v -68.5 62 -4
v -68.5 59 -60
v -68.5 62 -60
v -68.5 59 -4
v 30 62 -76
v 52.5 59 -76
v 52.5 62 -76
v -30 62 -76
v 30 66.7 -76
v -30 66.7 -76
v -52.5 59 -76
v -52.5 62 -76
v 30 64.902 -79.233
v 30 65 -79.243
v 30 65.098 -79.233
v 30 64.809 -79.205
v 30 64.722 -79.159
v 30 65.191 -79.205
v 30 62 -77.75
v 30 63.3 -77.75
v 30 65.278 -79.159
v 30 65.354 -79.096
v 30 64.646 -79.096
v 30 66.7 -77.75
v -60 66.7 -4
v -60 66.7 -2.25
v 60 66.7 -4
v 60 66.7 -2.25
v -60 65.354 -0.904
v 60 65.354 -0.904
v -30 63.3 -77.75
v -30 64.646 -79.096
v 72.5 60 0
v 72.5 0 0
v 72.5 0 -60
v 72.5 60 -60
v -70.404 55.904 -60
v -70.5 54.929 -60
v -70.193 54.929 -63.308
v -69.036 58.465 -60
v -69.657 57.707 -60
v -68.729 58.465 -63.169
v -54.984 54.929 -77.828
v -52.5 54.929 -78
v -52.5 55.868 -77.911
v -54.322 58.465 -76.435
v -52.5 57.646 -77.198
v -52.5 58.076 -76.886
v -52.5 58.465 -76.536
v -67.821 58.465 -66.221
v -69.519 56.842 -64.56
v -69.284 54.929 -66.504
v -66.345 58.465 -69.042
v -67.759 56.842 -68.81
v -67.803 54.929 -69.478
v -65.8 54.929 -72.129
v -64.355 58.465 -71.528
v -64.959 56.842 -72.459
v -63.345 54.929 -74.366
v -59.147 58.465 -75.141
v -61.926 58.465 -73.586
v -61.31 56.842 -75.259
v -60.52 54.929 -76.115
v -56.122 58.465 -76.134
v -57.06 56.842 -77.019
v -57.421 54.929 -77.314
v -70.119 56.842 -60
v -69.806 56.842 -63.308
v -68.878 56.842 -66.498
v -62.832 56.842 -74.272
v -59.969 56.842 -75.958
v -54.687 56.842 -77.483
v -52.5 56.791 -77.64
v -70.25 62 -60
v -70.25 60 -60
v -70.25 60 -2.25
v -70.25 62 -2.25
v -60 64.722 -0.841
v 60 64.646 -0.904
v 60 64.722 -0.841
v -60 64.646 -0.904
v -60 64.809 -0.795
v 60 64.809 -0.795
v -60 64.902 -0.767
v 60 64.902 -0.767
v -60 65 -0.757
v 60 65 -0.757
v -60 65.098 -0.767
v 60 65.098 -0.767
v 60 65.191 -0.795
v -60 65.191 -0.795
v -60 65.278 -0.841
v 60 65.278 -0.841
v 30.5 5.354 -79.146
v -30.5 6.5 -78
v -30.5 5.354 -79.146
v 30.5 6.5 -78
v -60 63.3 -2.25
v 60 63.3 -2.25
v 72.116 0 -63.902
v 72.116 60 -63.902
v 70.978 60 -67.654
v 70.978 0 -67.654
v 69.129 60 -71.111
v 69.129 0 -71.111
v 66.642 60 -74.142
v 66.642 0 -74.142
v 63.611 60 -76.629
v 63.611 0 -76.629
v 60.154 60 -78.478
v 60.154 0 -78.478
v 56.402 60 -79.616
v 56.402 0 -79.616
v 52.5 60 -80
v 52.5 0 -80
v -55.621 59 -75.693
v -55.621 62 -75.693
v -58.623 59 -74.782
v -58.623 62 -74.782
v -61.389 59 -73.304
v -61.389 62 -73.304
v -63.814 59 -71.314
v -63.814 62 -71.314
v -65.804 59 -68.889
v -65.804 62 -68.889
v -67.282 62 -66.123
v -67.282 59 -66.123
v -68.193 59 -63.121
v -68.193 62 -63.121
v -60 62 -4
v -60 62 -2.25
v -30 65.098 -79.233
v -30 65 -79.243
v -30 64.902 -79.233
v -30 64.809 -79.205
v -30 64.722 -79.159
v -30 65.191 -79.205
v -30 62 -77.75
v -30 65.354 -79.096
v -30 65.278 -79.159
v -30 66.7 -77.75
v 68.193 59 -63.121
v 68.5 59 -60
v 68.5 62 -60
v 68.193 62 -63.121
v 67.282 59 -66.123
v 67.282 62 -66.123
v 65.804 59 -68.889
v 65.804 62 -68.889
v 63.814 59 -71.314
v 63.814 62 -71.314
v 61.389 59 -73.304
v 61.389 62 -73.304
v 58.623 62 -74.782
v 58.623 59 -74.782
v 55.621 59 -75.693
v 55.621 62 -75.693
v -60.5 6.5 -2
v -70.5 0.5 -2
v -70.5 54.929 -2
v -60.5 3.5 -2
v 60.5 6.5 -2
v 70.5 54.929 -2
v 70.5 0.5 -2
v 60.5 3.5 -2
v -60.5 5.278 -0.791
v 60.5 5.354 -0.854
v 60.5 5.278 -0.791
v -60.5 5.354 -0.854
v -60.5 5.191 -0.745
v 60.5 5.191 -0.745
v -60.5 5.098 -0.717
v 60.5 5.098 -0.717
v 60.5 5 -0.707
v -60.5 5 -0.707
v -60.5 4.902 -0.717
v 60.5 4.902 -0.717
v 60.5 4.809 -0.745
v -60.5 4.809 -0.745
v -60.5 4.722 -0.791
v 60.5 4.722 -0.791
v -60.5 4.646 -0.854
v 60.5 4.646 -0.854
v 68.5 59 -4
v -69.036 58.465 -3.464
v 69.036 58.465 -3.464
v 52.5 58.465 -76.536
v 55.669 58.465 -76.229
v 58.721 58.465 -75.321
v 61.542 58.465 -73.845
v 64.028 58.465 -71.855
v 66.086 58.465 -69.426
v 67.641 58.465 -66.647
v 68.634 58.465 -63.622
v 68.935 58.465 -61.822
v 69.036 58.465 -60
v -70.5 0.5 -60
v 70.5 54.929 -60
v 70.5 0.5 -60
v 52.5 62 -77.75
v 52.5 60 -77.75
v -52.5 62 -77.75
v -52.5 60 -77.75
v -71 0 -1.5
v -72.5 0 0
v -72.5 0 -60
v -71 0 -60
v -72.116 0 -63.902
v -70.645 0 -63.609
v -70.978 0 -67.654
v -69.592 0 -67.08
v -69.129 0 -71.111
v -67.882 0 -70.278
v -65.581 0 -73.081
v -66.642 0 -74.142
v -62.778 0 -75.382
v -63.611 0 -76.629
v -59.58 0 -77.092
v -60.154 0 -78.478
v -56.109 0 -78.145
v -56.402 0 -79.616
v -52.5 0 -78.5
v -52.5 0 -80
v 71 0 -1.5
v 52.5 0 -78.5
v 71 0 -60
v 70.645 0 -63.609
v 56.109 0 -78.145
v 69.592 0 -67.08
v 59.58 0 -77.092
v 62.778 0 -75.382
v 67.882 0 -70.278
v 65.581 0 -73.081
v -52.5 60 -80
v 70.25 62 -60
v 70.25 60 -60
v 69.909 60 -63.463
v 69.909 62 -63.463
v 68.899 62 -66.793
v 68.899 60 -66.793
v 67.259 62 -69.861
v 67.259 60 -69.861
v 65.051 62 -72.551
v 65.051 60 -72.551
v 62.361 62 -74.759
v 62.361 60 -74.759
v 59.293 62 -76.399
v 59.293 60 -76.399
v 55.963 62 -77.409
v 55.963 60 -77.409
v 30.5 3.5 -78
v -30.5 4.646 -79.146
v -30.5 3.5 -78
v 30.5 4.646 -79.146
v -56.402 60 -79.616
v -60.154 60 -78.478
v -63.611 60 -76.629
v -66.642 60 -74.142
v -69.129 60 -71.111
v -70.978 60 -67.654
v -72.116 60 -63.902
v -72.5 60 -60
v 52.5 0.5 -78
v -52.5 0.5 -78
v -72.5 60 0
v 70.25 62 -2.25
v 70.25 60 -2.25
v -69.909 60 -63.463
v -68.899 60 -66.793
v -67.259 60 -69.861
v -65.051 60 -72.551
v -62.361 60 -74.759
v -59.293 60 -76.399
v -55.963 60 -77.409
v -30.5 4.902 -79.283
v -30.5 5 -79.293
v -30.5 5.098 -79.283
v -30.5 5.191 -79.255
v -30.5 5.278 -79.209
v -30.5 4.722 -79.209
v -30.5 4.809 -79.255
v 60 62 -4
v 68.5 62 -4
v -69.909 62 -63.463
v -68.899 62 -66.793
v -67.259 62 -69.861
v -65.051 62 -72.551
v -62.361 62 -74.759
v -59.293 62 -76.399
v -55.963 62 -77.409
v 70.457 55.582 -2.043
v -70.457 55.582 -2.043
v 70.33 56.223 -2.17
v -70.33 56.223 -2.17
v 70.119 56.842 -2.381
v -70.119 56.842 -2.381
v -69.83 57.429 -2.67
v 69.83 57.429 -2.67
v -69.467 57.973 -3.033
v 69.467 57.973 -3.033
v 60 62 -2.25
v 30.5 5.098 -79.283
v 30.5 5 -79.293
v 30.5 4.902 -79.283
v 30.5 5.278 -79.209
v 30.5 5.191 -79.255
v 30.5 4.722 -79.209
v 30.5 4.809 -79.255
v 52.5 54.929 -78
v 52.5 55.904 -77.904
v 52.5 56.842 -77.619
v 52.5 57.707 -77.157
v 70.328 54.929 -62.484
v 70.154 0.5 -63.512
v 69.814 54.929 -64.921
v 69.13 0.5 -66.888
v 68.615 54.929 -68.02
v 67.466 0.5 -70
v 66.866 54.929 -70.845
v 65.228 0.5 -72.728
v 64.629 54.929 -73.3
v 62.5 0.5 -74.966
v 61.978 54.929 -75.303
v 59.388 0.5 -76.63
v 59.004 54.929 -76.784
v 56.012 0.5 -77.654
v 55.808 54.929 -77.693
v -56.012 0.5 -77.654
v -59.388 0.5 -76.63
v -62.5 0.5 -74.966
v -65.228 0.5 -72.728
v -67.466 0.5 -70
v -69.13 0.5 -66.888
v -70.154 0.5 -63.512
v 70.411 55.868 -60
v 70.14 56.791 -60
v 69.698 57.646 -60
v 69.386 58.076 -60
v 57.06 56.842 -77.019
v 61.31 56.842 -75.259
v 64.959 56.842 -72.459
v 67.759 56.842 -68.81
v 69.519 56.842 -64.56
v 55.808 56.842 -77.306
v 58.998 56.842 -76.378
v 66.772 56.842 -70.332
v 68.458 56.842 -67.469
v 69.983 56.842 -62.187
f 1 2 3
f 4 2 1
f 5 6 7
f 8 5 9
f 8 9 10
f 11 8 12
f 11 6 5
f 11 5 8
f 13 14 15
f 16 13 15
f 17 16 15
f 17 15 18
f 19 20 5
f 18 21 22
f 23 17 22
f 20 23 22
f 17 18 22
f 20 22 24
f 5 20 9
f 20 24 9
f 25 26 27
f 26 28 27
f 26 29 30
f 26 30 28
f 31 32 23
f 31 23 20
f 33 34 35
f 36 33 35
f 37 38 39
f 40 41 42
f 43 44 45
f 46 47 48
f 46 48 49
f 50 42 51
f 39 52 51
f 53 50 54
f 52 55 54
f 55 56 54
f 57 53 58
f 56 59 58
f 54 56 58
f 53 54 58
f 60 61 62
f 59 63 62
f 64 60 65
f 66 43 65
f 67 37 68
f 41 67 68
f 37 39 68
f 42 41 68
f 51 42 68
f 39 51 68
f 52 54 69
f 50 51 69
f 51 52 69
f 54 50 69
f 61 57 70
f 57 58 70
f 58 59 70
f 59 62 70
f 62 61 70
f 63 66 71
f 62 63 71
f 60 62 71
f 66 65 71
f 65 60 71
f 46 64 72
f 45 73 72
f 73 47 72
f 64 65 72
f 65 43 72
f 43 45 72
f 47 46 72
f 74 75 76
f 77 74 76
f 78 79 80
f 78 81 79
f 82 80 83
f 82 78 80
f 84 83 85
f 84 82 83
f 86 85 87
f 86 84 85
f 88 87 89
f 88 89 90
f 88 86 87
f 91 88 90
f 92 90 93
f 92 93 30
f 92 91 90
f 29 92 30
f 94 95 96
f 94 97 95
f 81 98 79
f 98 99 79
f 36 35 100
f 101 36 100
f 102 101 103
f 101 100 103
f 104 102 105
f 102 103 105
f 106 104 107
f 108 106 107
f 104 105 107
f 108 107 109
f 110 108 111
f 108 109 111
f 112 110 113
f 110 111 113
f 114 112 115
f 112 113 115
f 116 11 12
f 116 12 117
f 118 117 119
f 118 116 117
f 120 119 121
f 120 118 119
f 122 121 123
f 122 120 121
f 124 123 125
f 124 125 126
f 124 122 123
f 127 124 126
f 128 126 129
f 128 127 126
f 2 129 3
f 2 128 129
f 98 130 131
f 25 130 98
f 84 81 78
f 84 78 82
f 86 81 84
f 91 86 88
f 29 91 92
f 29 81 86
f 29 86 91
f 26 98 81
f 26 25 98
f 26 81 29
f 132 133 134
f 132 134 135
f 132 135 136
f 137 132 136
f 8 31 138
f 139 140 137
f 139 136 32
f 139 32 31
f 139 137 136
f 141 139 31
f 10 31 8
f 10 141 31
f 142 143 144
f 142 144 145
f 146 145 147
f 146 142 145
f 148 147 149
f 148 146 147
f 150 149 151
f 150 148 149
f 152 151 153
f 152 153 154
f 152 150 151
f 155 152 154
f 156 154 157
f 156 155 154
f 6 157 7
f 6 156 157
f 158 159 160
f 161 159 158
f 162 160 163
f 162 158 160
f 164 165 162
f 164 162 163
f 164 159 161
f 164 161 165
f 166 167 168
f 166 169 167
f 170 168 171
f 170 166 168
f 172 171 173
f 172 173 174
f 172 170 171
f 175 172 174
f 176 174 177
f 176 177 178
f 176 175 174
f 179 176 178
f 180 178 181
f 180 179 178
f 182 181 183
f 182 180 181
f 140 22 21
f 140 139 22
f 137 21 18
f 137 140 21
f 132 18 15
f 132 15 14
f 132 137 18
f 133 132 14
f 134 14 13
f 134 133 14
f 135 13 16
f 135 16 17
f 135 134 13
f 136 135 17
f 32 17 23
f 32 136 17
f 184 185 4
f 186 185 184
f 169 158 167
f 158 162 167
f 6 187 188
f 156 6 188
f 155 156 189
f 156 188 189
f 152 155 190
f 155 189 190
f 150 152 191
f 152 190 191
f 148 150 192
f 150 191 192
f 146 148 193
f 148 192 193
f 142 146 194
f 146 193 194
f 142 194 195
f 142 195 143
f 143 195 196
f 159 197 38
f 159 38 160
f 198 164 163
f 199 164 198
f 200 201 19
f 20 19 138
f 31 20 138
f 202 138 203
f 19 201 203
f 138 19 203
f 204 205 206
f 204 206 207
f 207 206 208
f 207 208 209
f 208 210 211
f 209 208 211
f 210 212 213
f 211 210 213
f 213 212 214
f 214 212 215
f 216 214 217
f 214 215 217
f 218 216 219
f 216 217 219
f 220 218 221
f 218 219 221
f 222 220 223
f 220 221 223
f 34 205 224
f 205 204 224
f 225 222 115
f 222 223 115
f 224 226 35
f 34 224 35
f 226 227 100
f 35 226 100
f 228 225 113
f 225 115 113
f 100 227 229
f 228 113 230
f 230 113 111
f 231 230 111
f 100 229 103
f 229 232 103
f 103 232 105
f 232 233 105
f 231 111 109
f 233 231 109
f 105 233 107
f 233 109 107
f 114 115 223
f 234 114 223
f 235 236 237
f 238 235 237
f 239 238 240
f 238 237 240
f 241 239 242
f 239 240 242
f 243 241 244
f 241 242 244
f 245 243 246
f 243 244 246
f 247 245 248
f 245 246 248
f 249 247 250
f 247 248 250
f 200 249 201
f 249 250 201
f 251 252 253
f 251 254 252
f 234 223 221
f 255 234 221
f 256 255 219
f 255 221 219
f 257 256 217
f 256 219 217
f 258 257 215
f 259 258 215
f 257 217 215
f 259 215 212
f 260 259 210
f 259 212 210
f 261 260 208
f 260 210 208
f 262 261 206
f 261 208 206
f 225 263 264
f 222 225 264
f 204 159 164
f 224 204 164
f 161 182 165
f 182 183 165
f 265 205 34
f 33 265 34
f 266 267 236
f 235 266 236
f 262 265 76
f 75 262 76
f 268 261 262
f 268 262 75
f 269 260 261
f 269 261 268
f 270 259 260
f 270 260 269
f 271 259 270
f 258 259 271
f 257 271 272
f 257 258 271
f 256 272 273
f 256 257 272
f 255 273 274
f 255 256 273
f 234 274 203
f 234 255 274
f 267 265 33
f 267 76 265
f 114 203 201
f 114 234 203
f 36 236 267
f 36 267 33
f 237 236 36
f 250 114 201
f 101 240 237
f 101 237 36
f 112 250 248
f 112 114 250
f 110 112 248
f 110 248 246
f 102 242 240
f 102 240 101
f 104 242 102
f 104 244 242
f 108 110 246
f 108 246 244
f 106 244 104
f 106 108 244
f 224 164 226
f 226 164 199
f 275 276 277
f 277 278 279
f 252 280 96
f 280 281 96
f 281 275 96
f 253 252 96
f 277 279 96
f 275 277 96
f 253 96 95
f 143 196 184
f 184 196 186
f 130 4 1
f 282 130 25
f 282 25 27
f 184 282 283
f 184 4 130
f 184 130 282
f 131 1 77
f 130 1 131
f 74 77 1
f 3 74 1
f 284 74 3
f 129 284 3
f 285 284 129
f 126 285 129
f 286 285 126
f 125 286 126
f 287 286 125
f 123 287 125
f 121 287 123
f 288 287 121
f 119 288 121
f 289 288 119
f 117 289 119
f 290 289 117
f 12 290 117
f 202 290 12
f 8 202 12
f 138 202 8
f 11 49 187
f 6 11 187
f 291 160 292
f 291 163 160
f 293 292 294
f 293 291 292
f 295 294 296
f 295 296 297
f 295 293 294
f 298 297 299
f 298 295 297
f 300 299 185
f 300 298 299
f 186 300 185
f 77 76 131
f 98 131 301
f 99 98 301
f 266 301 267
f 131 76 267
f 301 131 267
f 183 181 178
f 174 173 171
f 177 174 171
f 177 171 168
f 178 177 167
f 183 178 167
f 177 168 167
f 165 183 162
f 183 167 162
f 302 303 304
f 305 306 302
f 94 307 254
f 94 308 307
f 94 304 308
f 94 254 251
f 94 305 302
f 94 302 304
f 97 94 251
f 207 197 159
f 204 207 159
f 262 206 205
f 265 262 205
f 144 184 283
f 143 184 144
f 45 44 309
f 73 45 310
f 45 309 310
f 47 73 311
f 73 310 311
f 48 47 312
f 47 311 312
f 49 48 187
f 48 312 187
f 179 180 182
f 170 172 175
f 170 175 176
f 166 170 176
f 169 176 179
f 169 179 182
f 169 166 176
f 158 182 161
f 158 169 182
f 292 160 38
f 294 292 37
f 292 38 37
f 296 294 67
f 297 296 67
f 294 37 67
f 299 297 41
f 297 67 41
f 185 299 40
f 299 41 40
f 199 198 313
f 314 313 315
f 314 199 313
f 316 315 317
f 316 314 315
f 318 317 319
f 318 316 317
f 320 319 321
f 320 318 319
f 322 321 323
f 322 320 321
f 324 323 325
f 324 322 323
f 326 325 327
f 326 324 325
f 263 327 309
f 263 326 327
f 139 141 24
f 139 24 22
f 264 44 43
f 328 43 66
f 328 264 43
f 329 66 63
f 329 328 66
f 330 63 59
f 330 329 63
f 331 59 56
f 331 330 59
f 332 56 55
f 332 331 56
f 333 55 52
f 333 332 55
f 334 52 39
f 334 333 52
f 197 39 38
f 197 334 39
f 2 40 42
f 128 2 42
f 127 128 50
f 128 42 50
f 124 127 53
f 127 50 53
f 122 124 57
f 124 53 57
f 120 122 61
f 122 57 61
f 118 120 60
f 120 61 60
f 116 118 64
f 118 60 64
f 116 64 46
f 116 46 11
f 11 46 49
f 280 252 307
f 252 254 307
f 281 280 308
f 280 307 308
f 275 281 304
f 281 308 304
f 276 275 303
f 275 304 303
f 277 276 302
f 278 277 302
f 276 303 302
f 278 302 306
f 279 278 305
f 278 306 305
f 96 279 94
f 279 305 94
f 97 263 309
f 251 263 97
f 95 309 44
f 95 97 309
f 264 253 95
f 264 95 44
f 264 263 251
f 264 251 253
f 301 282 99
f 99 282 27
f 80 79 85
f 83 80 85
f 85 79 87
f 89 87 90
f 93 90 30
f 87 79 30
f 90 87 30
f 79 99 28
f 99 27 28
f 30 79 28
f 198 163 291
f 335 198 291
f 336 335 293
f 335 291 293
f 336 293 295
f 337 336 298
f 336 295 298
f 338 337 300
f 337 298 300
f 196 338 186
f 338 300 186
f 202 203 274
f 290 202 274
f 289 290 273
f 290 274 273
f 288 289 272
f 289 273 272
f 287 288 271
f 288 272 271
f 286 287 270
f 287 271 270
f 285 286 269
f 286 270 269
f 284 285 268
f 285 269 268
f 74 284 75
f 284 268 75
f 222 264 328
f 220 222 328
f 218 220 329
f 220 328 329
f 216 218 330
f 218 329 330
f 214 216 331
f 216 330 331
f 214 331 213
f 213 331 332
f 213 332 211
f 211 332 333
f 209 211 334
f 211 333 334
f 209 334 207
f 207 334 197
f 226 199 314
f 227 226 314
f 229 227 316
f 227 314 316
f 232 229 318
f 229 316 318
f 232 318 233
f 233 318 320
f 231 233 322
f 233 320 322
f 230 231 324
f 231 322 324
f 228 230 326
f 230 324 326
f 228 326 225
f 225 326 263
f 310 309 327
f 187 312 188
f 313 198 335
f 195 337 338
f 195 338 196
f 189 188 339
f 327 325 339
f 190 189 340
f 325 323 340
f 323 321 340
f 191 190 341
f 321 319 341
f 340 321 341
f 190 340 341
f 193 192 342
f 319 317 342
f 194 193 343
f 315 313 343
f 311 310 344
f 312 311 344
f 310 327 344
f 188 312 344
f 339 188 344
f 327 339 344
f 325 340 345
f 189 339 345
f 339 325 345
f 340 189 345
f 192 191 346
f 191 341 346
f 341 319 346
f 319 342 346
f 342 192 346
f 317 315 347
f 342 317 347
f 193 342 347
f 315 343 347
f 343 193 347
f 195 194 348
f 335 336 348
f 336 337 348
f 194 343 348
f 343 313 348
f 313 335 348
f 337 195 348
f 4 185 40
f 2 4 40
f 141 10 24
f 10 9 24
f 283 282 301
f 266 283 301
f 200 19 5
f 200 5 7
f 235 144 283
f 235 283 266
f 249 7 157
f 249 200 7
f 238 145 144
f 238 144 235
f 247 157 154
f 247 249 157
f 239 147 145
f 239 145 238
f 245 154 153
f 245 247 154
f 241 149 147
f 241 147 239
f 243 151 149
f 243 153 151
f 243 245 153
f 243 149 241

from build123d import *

# Parameters (mm, degrees)
EXTRUDE_1_DEPTH     = 60
EXTRUDE_START       = -1
EXTRUDE_2_DEPTH     = 1
CHAMFER_3_SIZE      = 2
EXTRUDE_8_DEPTH     = 2
EXTRUDE_9_DEPTH     = 30
EXTRUDE_10_DEPTH    = 60
CUT_EXTRUDE_2_DEPTH = 60.5
CUT_EXTRUDE_3_DEPTH = 30.5
CHAMFER_6_SIZE      = 0.5
FILLET_3_R          = 5
FILLET_4_R          = 0.5
FILLET_5_R          = 0.5


with BuildPart() as part:
    # Эскиз1 → Бобышка-Вытянуть1 (new body)
    with BuildSketch(Plane(origin=(0, 0, 0), x_dir=(1, 0, 0), z_dir=(0, 1, 0))):
        with BuildLine():
            Line((-72.5, 0), (72.5, 0))
            Line((72.5, 0), (72.5, 60))
            ThreePointArc((72.5, 60), (66.642135624, 74.142135624), (52.5, 80))
            Line((52.5, 80), (-52.5, 80))
            ThreePointArc((-52.5, 80), (-66.642135624, 74.142135624), (-72.5, 60))
            Line((-72.5, 60), (-72.5, 0))
        make_face()
        with BuildLine():
            Line((-70.5, 2), (70.5, 2))
            Line((70.5, 2), (70.5, 60))
            ThreePointArc((70.5, 60), (65.227922061, 72.727922061), (52.5, 78))
            Line((52.5, 78), (-52.5, 78))
            ThreePointArc((-52.5, 78), (-65.227922061, 72.727922061), (-70.5, 60))
            Line((-70.5, 60), (-70.5, 2))
        make_face(mode=Mode.SUBTRACT)
    extrude(amount=EXTRUDE_1_DEPTH)

    # Эскиз2 → Бобышка-Вытянуть2 (add)
    with BuildSketch(Plane(origin=(0, 60, 0), x_dir=(1, 0, 0), z_dir=(0, 1, 0)).offset(EXTRUDE_START)):
        with BuildLine():
            Line((-72.5, 60), (-72.5, 0))
            Line((-72.5, 0), (72.5, 0))
            Line((72.5, 0), (72.5, 60))
            ThreePointArc((72.5, 60), (66.642135624, 74.142135624), (52.5, 80))
            Line((52.5, 80), (-52.5, 80))
            ThreePointArc((-52.5, 80), (-66.642135624, 74.142135624), (-72.5, 60))
        make_face()
        with BuildLine():
            Line((-68.5, 60), (-68.5, 4))
            Line((-68.5, 4), (68.5, 4))
            Line((68.5, 4), (68.5, 60))
            ThreePointArc((68.5, 60), (63.813708499, 71.313708499), (52.5, 76))
            Line((52.5, 76), (-52.5, 76))
            ThreePointArc((-52.5, 76), (-63.813708499, 71.313708499), (-68.5, 60))
        make_face(mode=Mode.SUBTRACT)
    extrude(amount=EXTRUDE_2_DEPTH)

    # Фаска3
    chamfer_3_edges = [part.edges().sort_by_distance(p)[0] for p in [
        (-65.227922061, 59, -72.727922061),
        (-70.5, 59, -31),
        (0, 59, -2),
        (70.5, 59, -31),
        (65.227922061, 59, -72.727922061),
        (0, 59, -78),
    ]]
    chamfer(chamfer_3_edges, length=CHAMFER_3_SIZE - 0.0001)  # a hair under: the kernel refuses the full size

    # Эскиз11 → Бобышка-Вытянуть8 (add)
    with BuildSketch(Plane(origin=(0, 60, 0), x_dir=(1, 0, 0), z_dir=(0, 1, 0))):
        with BuildLine():
            Line((70.25, 2.25), (70.25, 60))
            ThreePointArc((70.25, 60), (65.051145366, 72.551145366), (52.5, 77.75))
            Line((52.5, 77.75), (-52.5, 77.75))
            ThreePointArc((-52.5, 77.75), (-65.051145366, 72.551145366), (-70.25, 60))
            Line((-70.25, 60), (-70.25, 2.25))
            Line((-70.25, 2.25), (70.25, 2.25))
        make_face()
        with BuildLine():
            Line((68.5, 4), (68.5, 60))
            ThreePointArc((68.5, 60), (63.813708499, 71.313708499), (52.5, 76))
            Line((52.5, 76), (-52.5, 76))
            ThreePointArc((-52.5, 76), (-63.813708499, 71.313708499), (-68.5, 60))
            Line((-68.5, 60), (-68.5, 4))
            Line((-68.5, 4), (68.5, 4))
        make_face(mode=Mode.SUBTRACT)
    extrude(amount=EXTRUDE_8_DEPTH)

    # Эскиз12 → Бобышка-Вытянуть9 (add, symmetric)
    with BuildSketch(Plane(origin=(0, 0, 0), x_dir=(0, 0, -1), z_dir=(1, 0, 0))):
        Polygon((76, 62), (76, 66.7), (77.75, 66.7), (79.45, 65), (77.75, 63.3), (77.75, 62), align=None)
    extrude(amount=EXTRUDE_9_DEPTH, both=True)

    # Эскиз13 → Бобышка-Вытянуть10 (add, symmetric)
    with BuildSketch(Plane(origin=(0, 0, 0), x_dir=(0, 0, -1), z_dir=(1, 0, 0))):
        Polygon((2.25, 62), (2.25, 63.3), (0.55, 65), (2.25, 66.7), (4, 66.7), (4, 62), align=None)
    extrude(amount=EXTRUDE_10_DEPTH, both=True)

    # Эскиз15 → Вырез-Вытянуть2 (cut, symmetric)
    with BuildSketch(Plane(origin=(0, 0, 0), x_dir=(0, 0, -1), z_dir=(1, 0, 0))):
        Polygon((2, 3.5), (2, 6.5), (0.5, 5), align=None)
    extrude(amount=CUT_EXTRUDE_2_DEPTH, both=True, mode=Mode.SUBTRACT)

    # Эскиз16 → Вырез-Вытянуть3 (cut, symmetric)
    with BuildSketch(Plane(origin=(0, 0, 0), x_dir=(0, 0, -1), z_dir=(1, 0, 0))):
        Polygon((78, 3.5), (78, 6.5), (79.5, 5), align=None)
    extrude(amount=CUT_EXTRUDE_3_DEPTH, both=True, mode=Mode.SUBTRACT)

    # Фаска6
    chamfer_6_edges = [part.edges().sort_by_distance(p)[0] for p in [
        (-70.5, 0, -31),
        (0, 0, -2),
        (70.5, 0, -31),
        (65.227922061, 0, -72.727922061),
        (0, 0, -78),
        (-65.227922061, 0, -72.727922061),
    ]]
    chamfer(chamfer_6_edges, length=CHAMFER_6_SIZE)

    # Скругление3
    fillet_3_edges = [part.edges().sort_by_distance(p)[0] for p in [
        (70.5, 57.0001, -31),
        (65.227922061, 57.0001, -72.727922061),
        (0, 57.0001, -78),
        (-65.227922061, 57.0001, -72.727922061),
        (0, 57.0001, -2),
        (-70.5, 57.0001, -31),
    ]]
    fillet(fillet_3_edges, radius=FILLET_3_R)

    # Скругление4
    fillet_4_edges = [part.edges().sort_by_distance(p)[0] for p in [
        (0, 5, -0.5),
        (0, 5, -79.5),
    ]]
    fillet(fillet_4_edges, radius=FILLET_4_R)

    # Скругление5
    fillet_5_edges = [part.edges().sort_by_distance(p)[0] for p in [
        (0, 65, -79.45),
        (0, 65, -0.55),
    ]]
    fillet(fillet_5_edges, radius=FILLET_5_R)


solid = part.part
